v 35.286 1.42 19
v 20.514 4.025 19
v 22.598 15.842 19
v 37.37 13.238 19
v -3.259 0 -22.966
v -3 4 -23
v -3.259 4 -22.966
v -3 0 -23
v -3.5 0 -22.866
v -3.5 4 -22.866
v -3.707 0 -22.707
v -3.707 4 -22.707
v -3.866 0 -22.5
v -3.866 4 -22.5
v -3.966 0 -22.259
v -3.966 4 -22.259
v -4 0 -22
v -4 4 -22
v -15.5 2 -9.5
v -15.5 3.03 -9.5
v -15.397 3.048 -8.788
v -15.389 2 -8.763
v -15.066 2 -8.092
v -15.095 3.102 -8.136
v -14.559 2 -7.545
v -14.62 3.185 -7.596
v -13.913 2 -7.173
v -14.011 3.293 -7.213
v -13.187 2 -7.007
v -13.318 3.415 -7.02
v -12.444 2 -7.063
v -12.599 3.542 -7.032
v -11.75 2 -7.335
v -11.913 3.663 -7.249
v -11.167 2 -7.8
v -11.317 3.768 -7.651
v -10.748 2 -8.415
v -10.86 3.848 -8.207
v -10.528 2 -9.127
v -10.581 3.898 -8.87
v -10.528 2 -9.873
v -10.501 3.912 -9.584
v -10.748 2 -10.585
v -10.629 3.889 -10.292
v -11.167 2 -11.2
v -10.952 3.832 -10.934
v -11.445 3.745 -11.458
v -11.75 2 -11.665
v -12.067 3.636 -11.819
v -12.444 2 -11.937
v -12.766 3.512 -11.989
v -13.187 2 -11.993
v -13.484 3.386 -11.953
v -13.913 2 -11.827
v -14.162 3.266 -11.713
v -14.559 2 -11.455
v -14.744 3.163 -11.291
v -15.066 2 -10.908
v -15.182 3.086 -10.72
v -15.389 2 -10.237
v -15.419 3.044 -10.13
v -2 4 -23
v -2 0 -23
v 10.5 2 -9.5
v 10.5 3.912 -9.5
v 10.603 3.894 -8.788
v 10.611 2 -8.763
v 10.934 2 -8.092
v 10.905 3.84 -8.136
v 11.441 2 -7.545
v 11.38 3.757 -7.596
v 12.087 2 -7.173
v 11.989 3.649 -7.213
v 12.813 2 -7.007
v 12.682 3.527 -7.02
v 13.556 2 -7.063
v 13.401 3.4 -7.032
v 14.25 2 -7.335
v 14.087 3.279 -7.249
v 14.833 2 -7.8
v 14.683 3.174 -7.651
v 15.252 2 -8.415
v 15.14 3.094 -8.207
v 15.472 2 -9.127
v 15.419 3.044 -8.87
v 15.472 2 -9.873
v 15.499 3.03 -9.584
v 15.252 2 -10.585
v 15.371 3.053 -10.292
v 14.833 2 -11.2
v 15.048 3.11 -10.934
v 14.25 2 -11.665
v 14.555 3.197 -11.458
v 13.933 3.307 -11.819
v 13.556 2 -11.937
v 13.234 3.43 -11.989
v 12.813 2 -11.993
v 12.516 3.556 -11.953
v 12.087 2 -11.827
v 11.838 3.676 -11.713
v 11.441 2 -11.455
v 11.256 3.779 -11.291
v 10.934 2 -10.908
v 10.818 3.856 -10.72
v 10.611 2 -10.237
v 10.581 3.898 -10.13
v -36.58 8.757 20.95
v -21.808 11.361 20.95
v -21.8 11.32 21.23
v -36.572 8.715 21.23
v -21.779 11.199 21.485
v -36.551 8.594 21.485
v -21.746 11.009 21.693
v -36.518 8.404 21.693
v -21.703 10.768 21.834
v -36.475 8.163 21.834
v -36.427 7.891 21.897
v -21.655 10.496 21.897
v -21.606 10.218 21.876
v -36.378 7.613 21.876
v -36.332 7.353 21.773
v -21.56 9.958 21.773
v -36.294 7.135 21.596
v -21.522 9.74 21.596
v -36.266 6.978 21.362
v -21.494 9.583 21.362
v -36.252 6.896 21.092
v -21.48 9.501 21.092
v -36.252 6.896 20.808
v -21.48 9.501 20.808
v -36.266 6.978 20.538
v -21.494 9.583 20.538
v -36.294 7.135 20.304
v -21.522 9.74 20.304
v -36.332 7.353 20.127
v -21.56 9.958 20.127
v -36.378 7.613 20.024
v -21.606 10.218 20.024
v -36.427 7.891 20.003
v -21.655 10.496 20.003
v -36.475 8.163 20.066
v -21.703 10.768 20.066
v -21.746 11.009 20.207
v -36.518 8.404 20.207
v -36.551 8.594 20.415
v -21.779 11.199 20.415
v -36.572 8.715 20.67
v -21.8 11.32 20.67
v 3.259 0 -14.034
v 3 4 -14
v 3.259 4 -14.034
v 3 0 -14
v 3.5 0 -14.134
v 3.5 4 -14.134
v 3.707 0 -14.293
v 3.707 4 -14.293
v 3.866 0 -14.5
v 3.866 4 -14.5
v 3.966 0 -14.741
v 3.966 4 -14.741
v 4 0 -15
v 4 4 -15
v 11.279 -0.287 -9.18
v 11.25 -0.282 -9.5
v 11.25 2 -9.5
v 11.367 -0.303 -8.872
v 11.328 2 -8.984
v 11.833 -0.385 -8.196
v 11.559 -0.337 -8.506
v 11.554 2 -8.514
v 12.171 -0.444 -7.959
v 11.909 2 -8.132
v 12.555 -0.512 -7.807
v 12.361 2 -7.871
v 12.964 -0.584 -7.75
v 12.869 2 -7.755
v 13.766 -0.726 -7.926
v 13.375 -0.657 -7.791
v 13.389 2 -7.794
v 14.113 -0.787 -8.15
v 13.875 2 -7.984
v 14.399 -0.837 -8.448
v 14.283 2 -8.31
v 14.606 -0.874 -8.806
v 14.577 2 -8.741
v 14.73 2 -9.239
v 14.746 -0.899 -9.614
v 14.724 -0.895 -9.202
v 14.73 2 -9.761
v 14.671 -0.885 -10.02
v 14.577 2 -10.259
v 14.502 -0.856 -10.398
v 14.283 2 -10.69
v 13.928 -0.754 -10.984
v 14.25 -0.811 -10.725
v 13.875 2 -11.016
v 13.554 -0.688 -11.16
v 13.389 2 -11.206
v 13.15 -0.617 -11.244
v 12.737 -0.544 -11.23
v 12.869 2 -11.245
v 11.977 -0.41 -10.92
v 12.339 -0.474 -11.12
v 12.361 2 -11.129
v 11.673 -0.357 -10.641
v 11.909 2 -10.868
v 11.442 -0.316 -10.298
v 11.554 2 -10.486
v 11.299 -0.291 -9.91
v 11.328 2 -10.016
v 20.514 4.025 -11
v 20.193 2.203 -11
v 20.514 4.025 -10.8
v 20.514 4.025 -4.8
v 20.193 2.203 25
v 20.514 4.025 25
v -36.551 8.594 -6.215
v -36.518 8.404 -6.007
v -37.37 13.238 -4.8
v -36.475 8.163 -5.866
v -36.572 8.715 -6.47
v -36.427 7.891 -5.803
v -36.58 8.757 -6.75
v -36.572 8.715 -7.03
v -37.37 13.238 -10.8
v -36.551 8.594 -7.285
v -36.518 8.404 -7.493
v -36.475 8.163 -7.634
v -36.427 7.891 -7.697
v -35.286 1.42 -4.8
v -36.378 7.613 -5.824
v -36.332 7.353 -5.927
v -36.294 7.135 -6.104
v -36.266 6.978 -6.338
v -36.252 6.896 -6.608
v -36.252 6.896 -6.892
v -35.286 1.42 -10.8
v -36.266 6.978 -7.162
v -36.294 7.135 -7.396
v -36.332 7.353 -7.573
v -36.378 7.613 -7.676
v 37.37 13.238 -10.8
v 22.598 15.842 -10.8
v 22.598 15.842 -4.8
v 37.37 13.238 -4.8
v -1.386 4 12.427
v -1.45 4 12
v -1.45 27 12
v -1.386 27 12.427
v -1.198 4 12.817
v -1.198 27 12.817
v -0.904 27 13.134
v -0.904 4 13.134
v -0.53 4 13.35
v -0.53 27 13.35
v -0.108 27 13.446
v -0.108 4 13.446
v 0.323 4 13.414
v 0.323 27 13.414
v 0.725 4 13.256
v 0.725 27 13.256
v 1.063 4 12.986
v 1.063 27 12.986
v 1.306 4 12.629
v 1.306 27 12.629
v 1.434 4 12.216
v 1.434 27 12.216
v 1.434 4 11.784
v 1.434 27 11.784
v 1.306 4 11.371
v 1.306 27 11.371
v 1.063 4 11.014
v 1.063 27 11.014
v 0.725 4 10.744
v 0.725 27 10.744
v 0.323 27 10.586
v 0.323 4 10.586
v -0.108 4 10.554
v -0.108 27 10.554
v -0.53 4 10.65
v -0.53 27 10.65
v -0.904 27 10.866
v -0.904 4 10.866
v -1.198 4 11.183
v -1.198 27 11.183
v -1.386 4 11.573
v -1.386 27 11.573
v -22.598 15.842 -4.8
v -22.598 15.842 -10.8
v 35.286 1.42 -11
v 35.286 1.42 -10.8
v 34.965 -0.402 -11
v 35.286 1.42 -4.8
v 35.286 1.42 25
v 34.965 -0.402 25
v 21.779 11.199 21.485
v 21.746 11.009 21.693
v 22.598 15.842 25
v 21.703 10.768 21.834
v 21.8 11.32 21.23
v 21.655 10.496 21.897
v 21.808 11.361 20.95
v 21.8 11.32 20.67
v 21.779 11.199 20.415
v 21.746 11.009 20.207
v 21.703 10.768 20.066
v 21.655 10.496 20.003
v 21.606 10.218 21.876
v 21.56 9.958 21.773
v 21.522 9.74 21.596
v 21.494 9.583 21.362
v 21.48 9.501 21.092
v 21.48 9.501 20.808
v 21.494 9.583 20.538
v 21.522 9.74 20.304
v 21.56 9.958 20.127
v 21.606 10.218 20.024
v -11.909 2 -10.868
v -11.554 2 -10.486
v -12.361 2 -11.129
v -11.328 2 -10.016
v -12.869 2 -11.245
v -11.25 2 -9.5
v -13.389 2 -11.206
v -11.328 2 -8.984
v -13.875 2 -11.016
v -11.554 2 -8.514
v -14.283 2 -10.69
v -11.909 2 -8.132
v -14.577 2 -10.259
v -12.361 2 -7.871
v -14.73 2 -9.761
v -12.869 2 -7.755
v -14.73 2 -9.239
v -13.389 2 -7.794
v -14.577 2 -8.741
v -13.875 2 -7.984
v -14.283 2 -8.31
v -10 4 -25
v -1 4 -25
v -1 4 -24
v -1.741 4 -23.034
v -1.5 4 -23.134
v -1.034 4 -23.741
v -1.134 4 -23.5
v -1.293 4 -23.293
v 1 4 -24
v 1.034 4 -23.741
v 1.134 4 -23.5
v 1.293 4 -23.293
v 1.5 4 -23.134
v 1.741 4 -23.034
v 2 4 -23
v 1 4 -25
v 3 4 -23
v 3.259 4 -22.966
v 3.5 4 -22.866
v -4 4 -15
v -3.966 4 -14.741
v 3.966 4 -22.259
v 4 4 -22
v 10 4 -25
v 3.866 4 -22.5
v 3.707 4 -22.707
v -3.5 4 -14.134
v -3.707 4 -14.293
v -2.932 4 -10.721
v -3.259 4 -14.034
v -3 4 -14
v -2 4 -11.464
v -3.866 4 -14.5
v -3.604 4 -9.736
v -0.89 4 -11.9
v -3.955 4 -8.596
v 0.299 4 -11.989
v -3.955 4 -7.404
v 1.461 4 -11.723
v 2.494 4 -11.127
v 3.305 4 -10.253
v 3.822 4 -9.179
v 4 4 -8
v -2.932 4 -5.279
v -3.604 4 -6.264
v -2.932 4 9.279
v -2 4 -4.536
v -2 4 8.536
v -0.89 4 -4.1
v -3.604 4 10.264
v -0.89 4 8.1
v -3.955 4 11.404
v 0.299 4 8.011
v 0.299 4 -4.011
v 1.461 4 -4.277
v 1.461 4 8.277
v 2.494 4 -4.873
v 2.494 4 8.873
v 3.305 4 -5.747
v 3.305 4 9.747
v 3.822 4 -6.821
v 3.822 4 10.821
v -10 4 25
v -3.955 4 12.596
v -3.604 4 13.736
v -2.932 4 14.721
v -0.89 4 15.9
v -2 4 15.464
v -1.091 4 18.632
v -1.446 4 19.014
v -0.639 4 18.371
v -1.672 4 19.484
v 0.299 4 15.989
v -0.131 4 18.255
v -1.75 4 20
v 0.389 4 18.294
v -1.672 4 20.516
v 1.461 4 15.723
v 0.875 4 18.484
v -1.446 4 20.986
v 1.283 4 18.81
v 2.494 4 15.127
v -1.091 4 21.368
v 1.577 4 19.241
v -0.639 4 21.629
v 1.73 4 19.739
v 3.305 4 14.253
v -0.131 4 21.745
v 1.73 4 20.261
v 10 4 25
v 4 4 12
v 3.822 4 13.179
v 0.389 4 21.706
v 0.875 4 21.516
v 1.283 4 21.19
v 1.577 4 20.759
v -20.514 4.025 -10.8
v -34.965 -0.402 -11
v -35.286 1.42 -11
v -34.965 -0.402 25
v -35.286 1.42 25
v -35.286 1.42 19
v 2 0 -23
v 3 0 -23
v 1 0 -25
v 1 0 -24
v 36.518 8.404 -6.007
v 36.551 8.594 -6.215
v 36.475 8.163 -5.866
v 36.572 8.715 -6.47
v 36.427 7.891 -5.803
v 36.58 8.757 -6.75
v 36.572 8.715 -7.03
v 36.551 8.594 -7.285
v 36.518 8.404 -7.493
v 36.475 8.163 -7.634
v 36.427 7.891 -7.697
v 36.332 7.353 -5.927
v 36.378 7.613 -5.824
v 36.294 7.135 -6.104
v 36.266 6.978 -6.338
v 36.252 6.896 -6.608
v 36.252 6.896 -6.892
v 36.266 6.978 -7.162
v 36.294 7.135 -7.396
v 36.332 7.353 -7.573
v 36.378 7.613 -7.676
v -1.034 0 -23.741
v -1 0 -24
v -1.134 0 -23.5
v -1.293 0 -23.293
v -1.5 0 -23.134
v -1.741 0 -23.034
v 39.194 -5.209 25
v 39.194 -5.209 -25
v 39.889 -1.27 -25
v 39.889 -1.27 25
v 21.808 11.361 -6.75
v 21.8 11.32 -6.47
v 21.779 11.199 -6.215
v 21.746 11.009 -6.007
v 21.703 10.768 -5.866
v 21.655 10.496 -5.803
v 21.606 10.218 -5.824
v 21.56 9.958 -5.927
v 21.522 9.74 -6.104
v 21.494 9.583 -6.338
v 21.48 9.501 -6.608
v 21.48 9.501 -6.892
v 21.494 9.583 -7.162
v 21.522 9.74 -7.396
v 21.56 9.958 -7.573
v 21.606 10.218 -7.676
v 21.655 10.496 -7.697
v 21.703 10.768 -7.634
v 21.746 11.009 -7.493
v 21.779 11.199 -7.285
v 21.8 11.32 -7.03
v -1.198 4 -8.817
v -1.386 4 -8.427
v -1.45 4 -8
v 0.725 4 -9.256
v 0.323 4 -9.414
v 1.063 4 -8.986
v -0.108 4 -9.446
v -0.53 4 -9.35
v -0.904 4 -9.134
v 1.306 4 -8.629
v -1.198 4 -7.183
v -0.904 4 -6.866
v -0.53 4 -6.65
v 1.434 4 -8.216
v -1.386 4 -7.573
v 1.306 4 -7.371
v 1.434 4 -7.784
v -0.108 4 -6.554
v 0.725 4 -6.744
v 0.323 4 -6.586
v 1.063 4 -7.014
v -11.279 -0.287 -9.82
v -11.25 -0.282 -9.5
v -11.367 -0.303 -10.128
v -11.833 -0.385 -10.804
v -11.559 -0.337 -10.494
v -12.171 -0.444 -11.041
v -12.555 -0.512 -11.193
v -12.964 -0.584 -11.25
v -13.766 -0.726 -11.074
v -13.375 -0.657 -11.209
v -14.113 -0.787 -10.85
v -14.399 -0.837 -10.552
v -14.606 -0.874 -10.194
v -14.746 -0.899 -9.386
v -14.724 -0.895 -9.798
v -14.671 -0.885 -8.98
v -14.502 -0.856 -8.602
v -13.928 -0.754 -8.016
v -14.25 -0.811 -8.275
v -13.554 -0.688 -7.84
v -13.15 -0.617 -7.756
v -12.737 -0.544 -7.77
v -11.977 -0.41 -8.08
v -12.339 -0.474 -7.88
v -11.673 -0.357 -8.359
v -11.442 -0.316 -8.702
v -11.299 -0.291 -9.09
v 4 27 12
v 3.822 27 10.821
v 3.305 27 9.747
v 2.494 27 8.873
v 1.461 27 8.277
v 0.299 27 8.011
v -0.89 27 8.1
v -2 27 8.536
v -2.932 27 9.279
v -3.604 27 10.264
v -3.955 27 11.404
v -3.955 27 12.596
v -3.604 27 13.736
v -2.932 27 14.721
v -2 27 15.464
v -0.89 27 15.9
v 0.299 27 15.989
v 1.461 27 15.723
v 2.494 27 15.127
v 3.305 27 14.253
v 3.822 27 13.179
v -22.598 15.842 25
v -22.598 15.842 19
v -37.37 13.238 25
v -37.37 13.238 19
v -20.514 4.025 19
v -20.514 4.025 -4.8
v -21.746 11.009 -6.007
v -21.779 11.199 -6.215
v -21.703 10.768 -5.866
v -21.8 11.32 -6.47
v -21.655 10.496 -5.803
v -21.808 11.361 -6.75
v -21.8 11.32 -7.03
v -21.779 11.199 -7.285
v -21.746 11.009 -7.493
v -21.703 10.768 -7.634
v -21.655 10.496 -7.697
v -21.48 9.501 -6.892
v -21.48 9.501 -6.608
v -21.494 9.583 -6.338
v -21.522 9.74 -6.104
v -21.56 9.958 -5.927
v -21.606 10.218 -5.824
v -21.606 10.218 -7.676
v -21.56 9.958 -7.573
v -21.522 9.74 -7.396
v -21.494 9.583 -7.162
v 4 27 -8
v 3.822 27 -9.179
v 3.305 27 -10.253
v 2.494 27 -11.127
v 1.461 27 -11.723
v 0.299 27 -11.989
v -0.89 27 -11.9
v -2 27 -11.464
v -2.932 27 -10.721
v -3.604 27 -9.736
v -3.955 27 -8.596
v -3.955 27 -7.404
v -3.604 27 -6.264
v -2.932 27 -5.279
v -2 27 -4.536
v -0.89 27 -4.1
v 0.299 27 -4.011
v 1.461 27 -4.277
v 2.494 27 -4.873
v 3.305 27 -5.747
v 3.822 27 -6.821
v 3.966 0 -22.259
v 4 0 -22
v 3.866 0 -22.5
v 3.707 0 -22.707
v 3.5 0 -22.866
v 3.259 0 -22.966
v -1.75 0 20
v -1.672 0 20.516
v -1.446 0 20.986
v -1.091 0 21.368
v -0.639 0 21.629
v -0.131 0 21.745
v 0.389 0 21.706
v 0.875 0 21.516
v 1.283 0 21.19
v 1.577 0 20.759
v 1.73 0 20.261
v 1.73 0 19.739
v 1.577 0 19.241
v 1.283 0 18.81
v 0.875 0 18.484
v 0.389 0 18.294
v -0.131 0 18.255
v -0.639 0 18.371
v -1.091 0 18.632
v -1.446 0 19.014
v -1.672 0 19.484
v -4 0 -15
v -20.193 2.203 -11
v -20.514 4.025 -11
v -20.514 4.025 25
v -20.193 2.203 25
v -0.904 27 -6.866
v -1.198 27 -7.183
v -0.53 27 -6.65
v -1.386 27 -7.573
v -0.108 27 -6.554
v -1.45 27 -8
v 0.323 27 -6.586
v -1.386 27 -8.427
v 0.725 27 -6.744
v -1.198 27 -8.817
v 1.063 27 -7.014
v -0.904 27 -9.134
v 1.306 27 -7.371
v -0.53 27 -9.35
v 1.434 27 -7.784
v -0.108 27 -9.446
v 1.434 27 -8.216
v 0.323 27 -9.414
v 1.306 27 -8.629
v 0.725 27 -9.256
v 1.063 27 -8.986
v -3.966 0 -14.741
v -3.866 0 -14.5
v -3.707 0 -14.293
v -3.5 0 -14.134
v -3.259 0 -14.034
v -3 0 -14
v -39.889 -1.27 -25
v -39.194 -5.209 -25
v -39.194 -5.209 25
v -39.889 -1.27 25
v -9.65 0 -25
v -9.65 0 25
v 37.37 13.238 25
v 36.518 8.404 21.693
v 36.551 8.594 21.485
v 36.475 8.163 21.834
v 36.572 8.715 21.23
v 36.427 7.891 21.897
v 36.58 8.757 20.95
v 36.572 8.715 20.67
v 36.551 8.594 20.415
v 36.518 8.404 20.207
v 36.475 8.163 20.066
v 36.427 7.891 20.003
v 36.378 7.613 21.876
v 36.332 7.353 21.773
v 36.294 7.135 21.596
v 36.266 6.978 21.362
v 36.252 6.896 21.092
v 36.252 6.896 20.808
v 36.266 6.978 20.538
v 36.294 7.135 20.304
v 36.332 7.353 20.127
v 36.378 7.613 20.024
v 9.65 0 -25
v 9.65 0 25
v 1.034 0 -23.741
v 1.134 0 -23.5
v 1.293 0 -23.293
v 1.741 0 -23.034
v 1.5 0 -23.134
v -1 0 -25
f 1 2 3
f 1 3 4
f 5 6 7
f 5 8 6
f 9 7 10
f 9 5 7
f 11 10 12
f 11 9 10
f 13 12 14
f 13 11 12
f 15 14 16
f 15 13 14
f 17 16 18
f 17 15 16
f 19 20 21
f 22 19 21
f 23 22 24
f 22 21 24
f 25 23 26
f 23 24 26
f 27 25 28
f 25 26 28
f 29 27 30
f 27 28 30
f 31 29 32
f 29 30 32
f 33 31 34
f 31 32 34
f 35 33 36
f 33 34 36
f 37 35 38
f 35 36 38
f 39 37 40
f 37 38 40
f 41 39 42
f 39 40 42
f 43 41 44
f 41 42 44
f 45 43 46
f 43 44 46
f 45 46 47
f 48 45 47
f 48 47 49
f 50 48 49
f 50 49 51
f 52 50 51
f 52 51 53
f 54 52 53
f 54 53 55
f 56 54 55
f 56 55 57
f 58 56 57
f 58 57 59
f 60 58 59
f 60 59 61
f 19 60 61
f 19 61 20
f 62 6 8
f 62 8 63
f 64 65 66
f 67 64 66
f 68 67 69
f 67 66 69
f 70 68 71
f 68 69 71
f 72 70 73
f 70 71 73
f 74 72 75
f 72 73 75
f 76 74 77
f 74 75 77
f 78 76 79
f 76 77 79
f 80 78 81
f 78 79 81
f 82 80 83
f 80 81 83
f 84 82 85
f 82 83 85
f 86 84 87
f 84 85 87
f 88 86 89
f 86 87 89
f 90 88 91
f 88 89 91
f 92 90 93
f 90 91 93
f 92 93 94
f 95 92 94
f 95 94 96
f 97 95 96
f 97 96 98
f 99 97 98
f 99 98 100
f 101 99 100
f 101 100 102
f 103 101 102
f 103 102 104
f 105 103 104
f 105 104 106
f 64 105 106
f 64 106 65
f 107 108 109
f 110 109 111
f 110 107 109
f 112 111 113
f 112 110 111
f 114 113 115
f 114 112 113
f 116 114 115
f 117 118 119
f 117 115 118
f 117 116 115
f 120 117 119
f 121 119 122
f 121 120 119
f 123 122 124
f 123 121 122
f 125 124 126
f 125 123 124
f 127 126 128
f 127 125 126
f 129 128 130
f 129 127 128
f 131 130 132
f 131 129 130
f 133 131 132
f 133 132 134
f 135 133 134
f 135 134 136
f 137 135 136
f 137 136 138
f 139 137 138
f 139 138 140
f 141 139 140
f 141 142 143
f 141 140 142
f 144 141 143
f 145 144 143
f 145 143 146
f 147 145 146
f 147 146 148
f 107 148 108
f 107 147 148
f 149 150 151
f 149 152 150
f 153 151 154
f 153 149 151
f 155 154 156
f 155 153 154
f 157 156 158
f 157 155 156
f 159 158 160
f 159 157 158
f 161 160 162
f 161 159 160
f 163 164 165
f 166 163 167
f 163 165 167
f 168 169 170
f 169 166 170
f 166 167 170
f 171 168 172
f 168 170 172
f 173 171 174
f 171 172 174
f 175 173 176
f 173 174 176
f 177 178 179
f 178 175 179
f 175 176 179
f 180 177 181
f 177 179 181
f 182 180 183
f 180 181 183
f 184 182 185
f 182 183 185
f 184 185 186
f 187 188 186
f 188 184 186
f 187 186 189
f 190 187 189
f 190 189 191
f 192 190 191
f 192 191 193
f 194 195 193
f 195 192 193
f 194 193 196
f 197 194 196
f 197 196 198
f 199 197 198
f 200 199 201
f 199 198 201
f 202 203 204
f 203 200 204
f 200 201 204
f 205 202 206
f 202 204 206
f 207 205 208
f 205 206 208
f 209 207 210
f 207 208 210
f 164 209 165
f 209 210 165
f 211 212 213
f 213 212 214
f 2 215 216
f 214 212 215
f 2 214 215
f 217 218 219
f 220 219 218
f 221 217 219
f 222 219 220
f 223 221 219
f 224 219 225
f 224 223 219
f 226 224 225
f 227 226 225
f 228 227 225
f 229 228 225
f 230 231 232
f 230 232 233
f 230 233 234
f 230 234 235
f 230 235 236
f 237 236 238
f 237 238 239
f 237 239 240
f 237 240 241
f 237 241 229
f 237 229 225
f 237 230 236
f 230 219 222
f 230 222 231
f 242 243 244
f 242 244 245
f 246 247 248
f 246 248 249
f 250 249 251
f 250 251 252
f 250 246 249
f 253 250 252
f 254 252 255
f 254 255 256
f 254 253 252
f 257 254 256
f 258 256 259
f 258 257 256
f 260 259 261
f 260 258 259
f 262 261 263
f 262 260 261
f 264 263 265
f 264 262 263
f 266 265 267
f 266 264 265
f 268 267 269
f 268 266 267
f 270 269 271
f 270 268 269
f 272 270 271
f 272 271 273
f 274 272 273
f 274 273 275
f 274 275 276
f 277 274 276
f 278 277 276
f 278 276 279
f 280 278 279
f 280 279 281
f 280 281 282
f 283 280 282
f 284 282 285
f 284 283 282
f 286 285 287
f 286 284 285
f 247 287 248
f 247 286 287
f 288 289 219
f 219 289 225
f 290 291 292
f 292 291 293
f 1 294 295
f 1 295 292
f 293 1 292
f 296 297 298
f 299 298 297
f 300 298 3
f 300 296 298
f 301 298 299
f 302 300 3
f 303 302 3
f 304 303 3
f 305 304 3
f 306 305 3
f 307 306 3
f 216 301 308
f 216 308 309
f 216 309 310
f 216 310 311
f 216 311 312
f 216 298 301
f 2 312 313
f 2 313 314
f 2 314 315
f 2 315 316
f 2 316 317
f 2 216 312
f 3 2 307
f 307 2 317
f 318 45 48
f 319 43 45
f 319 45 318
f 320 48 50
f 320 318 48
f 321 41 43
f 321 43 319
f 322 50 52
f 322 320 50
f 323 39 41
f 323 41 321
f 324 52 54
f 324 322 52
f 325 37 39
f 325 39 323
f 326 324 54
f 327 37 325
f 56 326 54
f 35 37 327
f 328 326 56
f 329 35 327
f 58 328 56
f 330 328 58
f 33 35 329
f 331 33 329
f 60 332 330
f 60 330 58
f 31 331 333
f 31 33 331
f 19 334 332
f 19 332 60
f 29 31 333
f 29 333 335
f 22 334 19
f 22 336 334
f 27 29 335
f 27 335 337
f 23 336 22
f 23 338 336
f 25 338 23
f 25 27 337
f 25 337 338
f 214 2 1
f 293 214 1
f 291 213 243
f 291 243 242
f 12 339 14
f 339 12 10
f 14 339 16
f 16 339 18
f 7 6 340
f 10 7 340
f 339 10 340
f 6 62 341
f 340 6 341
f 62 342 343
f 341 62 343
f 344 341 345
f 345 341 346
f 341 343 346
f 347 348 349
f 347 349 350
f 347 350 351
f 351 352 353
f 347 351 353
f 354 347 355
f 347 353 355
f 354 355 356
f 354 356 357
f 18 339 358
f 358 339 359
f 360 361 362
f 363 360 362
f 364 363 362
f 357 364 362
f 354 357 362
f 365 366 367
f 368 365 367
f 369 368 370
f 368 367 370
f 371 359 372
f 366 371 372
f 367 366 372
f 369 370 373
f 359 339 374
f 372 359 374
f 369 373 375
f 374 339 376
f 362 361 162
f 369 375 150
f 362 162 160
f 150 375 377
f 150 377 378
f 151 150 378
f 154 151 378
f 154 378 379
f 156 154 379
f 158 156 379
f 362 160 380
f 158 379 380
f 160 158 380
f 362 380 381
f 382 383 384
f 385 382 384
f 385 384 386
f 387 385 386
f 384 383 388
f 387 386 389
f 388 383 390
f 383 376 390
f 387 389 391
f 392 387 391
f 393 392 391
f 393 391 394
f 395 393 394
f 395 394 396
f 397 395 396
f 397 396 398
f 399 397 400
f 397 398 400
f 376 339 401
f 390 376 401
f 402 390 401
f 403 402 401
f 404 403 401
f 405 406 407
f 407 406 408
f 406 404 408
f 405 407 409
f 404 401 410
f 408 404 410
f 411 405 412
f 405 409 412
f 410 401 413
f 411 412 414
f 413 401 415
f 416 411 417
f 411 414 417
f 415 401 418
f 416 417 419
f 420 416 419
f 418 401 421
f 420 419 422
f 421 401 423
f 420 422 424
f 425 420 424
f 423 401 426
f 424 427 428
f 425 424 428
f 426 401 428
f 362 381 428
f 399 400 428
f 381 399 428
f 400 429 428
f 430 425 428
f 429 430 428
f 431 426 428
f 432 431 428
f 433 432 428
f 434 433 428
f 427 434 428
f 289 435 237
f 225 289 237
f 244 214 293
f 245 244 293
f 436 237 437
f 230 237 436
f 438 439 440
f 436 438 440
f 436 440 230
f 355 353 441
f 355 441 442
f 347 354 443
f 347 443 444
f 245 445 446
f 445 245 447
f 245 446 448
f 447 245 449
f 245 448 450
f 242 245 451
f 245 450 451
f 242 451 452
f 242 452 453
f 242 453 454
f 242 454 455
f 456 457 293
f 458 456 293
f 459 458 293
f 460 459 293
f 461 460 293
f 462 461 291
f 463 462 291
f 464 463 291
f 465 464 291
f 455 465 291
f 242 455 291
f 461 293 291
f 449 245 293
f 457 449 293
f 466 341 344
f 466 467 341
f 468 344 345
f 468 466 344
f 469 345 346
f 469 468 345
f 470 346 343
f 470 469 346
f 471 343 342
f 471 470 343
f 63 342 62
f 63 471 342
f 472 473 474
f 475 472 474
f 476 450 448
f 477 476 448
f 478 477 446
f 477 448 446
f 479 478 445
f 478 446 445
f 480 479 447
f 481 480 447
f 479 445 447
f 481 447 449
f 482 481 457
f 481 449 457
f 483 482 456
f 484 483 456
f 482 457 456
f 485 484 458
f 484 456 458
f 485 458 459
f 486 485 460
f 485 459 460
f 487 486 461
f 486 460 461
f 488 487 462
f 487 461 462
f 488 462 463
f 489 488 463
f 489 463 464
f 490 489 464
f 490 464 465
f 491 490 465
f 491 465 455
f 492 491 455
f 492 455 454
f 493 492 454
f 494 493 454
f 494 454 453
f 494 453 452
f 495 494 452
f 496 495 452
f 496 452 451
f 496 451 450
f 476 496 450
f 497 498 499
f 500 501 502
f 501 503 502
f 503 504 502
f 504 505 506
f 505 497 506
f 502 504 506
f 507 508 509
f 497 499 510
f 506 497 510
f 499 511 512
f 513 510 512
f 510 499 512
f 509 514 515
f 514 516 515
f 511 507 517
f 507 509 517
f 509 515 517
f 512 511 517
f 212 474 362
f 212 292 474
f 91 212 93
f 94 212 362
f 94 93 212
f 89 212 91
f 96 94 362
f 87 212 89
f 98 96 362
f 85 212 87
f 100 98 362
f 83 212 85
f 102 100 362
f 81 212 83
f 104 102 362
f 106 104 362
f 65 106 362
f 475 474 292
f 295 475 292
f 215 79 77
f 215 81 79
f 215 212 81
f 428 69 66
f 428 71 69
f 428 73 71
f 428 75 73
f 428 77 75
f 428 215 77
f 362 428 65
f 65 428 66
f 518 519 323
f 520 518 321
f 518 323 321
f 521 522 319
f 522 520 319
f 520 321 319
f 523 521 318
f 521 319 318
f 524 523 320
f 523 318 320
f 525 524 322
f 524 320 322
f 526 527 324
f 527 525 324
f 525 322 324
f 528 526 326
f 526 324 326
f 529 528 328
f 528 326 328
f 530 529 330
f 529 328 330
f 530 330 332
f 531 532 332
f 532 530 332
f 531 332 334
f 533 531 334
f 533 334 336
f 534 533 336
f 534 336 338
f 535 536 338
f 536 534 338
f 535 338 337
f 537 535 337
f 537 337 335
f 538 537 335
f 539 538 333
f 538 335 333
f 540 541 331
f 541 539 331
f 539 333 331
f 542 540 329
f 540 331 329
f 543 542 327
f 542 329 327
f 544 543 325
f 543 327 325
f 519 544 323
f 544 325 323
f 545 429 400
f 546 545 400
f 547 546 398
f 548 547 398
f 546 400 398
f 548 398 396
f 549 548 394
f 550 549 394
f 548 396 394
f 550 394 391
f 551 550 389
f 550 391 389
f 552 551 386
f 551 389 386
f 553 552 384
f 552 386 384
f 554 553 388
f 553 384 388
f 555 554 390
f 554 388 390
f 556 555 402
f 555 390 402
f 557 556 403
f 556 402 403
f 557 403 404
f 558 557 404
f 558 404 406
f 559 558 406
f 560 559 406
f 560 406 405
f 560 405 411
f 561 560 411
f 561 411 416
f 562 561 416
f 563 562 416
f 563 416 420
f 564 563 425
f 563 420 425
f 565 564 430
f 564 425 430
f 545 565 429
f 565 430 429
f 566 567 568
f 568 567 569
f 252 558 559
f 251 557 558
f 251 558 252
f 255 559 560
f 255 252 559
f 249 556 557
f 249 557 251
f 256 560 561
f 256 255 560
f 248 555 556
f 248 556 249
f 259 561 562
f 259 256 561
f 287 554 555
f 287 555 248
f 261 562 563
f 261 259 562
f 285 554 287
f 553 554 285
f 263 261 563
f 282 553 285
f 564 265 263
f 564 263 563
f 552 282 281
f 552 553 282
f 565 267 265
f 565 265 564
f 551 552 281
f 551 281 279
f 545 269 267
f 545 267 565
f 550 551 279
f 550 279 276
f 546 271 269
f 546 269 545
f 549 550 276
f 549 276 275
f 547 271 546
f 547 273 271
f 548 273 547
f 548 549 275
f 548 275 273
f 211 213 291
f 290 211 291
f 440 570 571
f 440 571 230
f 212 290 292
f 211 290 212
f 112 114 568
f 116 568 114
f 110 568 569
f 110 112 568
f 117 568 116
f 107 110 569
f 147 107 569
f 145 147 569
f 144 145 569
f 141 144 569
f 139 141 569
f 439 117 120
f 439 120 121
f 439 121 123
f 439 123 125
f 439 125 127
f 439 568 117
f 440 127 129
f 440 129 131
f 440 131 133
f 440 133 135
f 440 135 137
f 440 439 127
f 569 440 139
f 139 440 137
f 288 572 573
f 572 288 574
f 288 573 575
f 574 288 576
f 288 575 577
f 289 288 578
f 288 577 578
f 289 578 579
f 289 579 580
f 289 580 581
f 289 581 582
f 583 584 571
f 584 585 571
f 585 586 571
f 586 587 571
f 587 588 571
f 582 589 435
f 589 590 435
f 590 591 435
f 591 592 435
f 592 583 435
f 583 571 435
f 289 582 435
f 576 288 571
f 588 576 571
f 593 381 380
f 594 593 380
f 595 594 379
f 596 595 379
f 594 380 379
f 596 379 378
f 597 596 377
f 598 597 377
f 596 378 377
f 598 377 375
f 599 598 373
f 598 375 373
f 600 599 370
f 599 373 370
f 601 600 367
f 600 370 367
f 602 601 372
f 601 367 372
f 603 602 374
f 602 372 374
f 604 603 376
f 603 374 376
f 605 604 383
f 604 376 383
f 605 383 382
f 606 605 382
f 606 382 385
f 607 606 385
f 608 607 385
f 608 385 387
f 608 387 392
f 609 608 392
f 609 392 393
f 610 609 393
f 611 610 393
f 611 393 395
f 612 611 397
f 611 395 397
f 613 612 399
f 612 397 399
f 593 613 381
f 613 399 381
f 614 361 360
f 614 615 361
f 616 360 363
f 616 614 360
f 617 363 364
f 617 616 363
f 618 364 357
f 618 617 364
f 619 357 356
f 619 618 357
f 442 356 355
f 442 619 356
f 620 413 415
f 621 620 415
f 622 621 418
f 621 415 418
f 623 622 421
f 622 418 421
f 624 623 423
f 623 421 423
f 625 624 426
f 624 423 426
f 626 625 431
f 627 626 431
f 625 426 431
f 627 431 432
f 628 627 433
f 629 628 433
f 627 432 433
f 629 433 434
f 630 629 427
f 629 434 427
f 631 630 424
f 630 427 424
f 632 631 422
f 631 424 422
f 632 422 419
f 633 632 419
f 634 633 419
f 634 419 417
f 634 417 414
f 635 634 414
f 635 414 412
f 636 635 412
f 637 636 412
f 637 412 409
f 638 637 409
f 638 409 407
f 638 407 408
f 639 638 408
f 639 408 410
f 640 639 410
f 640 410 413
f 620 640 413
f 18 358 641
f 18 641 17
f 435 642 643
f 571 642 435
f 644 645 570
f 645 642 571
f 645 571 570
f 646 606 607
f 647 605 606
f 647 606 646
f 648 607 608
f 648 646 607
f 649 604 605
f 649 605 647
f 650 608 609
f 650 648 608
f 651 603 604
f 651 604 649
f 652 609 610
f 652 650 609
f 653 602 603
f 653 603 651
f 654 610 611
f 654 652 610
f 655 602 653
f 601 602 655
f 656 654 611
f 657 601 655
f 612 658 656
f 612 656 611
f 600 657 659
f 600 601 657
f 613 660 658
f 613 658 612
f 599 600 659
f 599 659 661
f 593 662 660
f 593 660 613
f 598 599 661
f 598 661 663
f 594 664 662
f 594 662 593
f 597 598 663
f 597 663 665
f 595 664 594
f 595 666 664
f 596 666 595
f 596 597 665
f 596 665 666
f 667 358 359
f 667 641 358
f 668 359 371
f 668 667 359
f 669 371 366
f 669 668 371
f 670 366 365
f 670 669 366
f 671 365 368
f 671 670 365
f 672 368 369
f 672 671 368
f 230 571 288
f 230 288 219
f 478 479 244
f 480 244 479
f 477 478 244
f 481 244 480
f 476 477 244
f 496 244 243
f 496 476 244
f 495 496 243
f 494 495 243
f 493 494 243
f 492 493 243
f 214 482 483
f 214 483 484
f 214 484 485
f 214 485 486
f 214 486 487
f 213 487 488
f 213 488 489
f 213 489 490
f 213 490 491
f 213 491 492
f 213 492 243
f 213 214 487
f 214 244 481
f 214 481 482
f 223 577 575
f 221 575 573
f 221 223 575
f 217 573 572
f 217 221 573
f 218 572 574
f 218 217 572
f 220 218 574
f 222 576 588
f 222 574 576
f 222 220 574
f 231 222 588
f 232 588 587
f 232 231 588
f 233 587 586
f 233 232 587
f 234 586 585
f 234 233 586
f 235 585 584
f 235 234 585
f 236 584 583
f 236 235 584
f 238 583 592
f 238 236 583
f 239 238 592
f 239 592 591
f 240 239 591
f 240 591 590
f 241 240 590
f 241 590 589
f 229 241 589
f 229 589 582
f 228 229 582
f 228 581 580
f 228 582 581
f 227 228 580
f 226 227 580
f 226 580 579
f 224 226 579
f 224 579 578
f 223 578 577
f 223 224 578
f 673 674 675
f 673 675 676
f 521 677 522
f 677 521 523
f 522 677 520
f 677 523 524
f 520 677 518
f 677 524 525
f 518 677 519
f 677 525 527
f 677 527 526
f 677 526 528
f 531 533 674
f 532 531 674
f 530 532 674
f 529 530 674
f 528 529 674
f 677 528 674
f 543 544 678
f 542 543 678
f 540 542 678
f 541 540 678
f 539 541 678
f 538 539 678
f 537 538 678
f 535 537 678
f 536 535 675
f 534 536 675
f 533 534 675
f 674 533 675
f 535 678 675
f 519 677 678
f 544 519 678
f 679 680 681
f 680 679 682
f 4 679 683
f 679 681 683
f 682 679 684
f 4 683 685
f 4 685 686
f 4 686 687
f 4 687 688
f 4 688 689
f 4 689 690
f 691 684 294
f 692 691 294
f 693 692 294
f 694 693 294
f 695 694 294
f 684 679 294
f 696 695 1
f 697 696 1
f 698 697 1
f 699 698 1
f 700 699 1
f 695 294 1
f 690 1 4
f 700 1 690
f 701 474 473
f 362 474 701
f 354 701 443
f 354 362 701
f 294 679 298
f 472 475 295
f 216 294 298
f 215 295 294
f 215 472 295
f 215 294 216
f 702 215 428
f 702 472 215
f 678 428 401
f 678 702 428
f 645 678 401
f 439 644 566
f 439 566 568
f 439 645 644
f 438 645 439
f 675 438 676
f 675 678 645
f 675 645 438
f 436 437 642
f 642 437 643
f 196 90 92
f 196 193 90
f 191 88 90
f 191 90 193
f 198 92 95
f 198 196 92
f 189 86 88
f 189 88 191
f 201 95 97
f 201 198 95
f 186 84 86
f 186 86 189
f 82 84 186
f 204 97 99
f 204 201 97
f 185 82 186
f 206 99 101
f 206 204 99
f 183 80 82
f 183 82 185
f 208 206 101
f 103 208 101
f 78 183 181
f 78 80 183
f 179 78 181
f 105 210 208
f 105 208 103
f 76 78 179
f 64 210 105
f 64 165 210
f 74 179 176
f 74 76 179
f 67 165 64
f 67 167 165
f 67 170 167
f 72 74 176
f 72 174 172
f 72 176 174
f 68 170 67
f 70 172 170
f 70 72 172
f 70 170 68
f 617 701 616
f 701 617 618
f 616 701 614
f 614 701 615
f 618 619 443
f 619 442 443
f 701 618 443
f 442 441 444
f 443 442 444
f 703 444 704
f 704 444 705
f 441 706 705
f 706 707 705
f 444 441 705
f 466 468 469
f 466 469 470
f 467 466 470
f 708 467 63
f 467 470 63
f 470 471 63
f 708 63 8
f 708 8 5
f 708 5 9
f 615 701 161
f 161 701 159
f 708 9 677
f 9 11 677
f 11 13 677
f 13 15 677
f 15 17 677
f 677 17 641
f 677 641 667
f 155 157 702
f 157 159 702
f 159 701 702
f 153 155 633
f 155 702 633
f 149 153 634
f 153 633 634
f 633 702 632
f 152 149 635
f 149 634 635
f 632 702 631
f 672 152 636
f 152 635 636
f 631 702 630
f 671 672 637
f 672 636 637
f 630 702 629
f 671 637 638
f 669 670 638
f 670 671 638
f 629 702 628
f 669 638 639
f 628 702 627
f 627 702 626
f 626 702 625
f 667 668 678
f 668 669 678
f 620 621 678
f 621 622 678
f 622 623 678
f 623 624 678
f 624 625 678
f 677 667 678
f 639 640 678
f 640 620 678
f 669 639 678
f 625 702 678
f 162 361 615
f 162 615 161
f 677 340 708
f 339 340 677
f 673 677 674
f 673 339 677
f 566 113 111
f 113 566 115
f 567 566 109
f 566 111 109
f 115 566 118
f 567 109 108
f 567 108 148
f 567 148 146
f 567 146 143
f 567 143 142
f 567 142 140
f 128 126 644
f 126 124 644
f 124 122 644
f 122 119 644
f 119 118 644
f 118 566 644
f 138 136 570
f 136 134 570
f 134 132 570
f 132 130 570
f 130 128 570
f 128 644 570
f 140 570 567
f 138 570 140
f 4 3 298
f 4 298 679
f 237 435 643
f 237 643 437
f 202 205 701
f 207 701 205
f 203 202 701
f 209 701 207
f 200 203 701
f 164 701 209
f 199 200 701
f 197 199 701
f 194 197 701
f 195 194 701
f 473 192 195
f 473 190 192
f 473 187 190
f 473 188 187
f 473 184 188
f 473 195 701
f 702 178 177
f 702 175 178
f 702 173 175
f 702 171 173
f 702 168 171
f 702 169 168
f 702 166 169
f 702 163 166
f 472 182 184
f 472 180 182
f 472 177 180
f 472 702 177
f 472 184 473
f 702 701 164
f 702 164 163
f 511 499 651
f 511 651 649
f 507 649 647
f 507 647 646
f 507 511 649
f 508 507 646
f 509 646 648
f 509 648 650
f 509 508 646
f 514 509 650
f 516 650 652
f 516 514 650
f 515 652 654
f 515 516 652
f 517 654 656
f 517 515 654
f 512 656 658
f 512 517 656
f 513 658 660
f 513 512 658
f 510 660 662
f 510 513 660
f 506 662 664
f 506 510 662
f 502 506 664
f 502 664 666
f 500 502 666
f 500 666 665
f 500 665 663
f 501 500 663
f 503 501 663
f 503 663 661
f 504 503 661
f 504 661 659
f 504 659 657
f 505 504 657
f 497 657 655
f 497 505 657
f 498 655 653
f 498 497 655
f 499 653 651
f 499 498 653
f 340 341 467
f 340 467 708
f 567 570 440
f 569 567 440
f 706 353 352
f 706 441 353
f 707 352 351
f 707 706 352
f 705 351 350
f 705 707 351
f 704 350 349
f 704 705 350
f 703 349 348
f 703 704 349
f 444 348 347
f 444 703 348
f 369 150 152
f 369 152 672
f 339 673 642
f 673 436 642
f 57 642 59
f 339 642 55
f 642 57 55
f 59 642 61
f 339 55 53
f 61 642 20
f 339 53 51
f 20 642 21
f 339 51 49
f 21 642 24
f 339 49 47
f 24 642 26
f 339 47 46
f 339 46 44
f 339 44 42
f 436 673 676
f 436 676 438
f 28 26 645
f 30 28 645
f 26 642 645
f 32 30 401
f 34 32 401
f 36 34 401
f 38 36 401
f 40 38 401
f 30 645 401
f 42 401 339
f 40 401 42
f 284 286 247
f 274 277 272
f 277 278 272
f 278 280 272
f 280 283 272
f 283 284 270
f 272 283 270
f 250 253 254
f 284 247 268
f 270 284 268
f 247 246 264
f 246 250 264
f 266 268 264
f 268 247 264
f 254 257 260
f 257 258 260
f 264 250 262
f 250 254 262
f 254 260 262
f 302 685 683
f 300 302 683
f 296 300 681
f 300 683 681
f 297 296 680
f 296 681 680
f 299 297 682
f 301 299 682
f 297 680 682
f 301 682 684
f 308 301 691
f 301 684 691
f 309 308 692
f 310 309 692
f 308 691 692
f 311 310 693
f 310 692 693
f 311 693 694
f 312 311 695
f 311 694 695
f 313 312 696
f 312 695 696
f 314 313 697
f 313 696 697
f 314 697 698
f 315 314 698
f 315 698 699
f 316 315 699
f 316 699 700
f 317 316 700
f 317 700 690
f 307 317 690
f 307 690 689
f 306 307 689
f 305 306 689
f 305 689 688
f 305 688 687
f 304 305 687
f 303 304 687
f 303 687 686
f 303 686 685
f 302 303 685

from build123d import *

# Parameters (mm, degrees)
EXTRUDE_1_DEPTH     = 25
EXTRUDE_2_DEPTH     = 36
SKETCH_3_W          = 15
SKETCH_3_H          = 6
EXTRUDE_3_DEPTH     = 12
SKETCH_4_R          = 0.95
CUT_EXTRUDE_1_DEPTH = 21
SKETCH_5_R          = 4
SKETCH_5_R_2        = 1.45
EXTRUDE_4_DEPTH     = 23
SKETCH_6_R          = 1.75
CUT_EXTRUDE_2_DEPTH = 20
SKETCH_7_R          = 2.5
CUT_EXTRUDE_3_DEPTH = 2
CUT_EXTRUDE_4_DEPTH = 53.393911874
FILLET_4_R          = 1


with BuildPart() as part:
    # 草图1 → 凸台-拉伸1 (new, symmetric)
    with BuildSketch(Plane.XY):
        Polygon((0, 0), (9.650045346, 0), (39.194277936, -5.20944533), (39.888870647, -1.270214318), (10, 4), (0, 4), align=None)
    extrude_1 = extrude(amount=EXTRUDE_1_DEPTH, both=True)

    # 草图2 → 凸台-拉伸2 (add)
    with BuildSketch(Plane.XY.offset(25)):
        Polygon((20.192715587, 2.202749235), (20.513964715, 4.024643578), (35.286081011, 1.419920913), (34.964831882, -0.40197343), align=None)
    extrude_2 = extrude(amount=-EXTRUDE_2_DEPTH)

    # 草图3 → 凸台-拉伸3 (add)
    with BuildSketch(Plane(origin=(1.306826311, 7.411380301, 0), x_dir=(0.9848077530122079, -0.1736481776669312, 0), z_dir=(0.1736481776669312, 0.9848077530122079, 0))):
        with Locations((27.003439474, -22)):
            Rectangle(SKETCH_3_W, SKETCH_3_H)
        with Locations((27.003439474, 7.8)):
            Rectangle(SKETCH_3_W, SKETCH_3_H)
    extrude_3 = extrude(amount=EXTRUDE_3_DEPTH)

    # 草图4 → 切除-拉伸1 (cut)
    with BuildSketch(Plane(origin=(33.979254699, -5.991459388, 0), x_dir=(0, 0, -1), z_dir=(0.9848077530122081, -0.17364817766693072, 0))):
        with Locations(Location((-20.95, 14.025712789, 0), (0, 0, 90))):
            Circle(SKETCH_4_R)
        with Locations(Location((6.75, 14.025712789, 0), (0, 0, 90))):
            Circle(SKETCH_4_R)
    cut_extrude_1 = extrude(amount=-CUT_EXTRUDE_1_DEPTH, mode=Mode.SUBTRACT)

    # 镜向1: 凸台-拉伸1, 凸台-拉伸2, 凸台-拉伸3, 切除-拉伸1 across plane
    add(extrude_1.mirror(Plane(origin=(0, 0, 0), x_dir=(0, 0, 1), z_dir=(1, 0, 0))))
    add(extrude_2.mirror(Plane(origin=(0, 0, 0), x_dir=(0, 0, 1), z_dir=(1, 0, 0))))
    add(extrude_3.mirror(Plane(origin=(0, 0, 0), x_dir=(0, 0, 1), z_dir=(1, 0, 0))))
    add(cut_extrude_1.mirror(Plane(origin=(0, 0, 0), x_dir=(0, 0, 1), z_dir=(1, 0, 0))), mode=Mode.SUBTRACT)

    # 草图5 → 凸台-拉伸4 (add)
    # profile 1 of 2: a face of its own
    with BuildSketch(Plane(origin=(0, 4, 0), x_dir=(1, 0, 0), z_dir=(0, 1, 0))):
        with Locations((0, -12)):
            Circle(SKETCH_5_R)
        with Locations(Location((0, -12, 0), (0, 0, 180))):
            Circle(SKETCH_5_R_2, mode=Mode.SUBTRACT)
    # profile 2 of 2: a face of its own
    with BuildSketch(Plane(origin=(0, 4, 0), x_dir=(1, 0, 0), z_dir=(0, 1, 0))):
        with Locations((0, 8)):
            Circle(SKETCH_5_R)
        with Locations(Location((0, 8, 0), (0, 0, 180))):
            Circle(SKETCH_5_R_2, mode=Mode.SUBTRACT)
    extrude(amount=EXTRUDE_4_DEPTH)

    # 草图6 → 切除-拉伸2 (cut)
    with BuildSketch(Plane(origin=(0, 4, 0), x_dir=(1, 0, 0), z_dir=(0, 1, 0))):
        with Locations(Location((0, -20, 0), (0, 0, 180))):
            Circle(SKETCH_6_R)
        with Locations((-13, 9.5)):
            Circle(SKETCH_6_R)
        with Locations(Location((13, 9.5, 0), (0, 0, 180))):
            Circle(SKETCH_6_R)
    extrude(amount=-CUT_EXTRUDE_2_DEPTH, mode=Mode.SUBTRACT)

    # 草图7 → 切除-拉伸3 (cut)
    with BuildSketch(Plane(origin=(0, 4, 0), x_dir=(1, 0, 0), z_dir=(0, 1, 0))):
        with Locations(Location((-13, 9.5, 0), (0, 0, 180))):
            Circle(SKETCH_7_R)
        with Locations(Location((13, 9.5, 0), (0, 0, 180))):
            Circle(SKETCH_7_R)
    extrude(amount=-CUT_EXTRUDE_3_DEPTH, mode=Mode.SUBTRACT)

    # 草图8 → 切除-拉伸4 (cut, through all)
    with BuildSketch(Plane(origin=(0, 4, 0), x_dir=(1, 0, 0), z_dir=(0, 1, 0))):
        Polygon((-4, 23), (-1, 23), (-1, 25), (1, 25), (1, 23), (4, 23), (4, 14), (-4, 14), align=None)
    extrude(amount=-CUT_EXTRUDE_4_DEPTH, mode=Mode.SUBTRACT)

    # 圆角4
    fillet_4_edges = [part.edges().sort_by_distance(p)[0] for p in [
        (4, 2, -23),
        (4, 2, -14),
        (-4, 2, -14),
        (-4, 2, -23),
        (1, 2, -23),
        (-1, 2, -23),
    ]]
    fillet(fillet_4_edges, radius=FILLET_4_R)


solid = part.part
